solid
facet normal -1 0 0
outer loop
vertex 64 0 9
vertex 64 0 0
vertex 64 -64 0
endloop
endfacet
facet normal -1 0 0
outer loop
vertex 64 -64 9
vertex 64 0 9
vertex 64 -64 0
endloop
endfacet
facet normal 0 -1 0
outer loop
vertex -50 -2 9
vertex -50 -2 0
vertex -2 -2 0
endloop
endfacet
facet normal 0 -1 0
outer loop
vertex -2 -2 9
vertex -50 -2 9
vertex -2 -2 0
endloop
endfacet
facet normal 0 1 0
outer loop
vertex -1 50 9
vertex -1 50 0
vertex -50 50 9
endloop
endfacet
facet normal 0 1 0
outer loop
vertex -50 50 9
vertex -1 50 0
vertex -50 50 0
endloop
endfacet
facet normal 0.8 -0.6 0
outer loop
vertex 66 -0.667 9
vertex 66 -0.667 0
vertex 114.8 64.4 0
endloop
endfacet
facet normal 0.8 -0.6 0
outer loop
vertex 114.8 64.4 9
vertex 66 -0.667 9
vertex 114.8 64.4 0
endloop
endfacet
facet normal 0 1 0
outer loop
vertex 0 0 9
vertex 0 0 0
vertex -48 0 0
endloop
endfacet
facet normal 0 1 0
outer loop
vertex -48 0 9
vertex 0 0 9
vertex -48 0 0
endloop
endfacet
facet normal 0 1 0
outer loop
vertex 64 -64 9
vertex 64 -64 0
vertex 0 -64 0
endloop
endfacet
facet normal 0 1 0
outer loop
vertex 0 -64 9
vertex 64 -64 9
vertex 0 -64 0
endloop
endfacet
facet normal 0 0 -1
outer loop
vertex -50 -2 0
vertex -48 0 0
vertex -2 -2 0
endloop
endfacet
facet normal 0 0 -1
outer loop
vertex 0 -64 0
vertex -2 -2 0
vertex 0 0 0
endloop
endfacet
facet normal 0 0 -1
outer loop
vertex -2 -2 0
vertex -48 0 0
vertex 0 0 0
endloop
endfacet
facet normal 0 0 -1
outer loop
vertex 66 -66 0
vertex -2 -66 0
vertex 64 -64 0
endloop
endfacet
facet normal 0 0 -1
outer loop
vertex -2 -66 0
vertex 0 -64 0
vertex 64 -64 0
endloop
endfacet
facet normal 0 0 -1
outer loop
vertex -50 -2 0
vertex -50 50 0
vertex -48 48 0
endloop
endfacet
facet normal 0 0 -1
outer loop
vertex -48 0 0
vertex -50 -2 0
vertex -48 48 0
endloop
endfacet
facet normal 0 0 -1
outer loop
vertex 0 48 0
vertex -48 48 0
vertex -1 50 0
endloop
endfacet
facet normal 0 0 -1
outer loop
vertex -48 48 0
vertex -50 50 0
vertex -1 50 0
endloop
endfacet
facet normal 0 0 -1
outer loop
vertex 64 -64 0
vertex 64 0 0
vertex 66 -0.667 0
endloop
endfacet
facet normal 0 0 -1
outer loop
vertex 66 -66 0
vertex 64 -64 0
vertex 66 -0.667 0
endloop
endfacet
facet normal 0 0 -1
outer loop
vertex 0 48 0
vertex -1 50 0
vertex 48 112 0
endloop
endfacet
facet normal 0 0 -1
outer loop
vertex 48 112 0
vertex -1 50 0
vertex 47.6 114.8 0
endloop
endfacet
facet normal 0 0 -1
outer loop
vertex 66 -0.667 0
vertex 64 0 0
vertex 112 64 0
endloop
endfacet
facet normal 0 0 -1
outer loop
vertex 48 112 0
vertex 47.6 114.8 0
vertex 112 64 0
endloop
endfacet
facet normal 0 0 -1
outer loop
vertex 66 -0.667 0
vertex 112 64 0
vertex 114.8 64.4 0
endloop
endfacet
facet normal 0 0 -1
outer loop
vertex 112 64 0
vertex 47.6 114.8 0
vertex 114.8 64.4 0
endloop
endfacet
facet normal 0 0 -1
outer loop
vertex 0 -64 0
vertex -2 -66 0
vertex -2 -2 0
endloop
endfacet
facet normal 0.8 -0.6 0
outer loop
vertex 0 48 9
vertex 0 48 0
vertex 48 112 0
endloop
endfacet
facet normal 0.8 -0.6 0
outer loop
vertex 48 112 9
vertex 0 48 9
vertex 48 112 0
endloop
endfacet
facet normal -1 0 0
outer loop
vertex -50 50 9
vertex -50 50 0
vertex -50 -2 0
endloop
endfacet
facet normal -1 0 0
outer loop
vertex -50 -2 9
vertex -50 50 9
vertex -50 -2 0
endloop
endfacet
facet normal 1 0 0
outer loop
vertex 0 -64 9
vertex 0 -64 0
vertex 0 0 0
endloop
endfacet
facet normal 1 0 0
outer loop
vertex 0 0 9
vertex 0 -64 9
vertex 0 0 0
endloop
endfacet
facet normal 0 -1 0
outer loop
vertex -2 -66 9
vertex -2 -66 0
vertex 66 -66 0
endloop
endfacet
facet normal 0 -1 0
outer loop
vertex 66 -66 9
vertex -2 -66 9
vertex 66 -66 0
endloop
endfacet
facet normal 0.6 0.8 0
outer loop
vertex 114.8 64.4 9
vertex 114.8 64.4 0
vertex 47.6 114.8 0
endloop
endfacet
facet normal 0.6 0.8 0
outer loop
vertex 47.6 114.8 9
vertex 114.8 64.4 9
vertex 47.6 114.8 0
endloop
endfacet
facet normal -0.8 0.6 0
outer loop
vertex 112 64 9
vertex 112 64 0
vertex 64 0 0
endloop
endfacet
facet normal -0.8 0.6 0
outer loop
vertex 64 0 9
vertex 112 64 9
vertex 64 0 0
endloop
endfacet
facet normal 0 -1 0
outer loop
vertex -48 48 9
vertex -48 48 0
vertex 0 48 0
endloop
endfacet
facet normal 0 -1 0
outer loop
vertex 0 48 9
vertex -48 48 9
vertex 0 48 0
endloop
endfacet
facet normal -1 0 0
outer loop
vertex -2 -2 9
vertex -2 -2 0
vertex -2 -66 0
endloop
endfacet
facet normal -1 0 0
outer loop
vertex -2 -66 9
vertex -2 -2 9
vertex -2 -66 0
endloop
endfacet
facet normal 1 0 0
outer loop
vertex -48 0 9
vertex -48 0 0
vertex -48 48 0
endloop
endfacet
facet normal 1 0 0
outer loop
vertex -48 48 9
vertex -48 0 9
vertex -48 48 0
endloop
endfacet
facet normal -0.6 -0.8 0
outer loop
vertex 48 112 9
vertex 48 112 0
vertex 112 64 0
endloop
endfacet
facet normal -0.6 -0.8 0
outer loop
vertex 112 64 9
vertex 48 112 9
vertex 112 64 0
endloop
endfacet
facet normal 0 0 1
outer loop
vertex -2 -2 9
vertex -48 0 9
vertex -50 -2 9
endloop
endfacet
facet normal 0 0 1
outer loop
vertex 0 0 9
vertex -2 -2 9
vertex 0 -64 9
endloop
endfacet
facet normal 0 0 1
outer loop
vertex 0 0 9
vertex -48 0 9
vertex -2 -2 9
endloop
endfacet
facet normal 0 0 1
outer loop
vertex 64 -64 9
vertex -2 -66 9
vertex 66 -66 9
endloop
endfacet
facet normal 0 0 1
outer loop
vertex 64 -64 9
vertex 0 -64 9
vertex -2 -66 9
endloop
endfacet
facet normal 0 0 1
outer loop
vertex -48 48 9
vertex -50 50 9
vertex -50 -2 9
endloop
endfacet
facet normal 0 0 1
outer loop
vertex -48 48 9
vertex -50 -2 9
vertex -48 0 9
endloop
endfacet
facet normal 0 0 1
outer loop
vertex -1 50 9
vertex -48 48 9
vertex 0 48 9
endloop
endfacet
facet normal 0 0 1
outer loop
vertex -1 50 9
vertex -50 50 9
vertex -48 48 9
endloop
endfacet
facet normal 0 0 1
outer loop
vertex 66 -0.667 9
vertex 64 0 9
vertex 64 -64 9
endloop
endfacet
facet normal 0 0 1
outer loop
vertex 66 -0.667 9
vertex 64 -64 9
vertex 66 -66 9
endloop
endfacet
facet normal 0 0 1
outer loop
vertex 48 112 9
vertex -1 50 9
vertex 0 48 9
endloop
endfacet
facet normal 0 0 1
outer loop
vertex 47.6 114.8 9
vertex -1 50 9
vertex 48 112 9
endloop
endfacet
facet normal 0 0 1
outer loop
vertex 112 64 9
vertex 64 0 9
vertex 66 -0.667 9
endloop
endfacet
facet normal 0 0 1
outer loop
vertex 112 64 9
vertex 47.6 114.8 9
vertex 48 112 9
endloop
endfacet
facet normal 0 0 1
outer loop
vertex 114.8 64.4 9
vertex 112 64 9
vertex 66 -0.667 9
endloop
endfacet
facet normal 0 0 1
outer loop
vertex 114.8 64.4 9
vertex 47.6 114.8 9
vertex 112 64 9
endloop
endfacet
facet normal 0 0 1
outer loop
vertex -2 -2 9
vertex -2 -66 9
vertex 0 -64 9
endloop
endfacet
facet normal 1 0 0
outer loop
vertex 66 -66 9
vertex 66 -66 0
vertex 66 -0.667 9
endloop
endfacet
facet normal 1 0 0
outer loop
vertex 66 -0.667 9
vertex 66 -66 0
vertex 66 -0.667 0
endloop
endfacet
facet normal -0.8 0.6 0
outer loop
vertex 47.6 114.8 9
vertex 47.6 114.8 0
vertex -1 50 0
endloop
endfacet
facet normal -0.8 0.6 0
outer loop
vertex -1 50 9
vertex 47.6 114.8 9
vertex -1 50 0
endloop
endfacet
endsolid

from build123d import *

# Parameters (mm, degrees)
PAD_DEPTH = 9


with BuildPart() as part:
    # Sketch → Pad (new body)
    with BuildSketch(Plane.XY):
        Polygon((-1, 50), (-50, 50), (-50, -2), (-2, -2), (-2, -66), (66, -66), (66, -0.666667), (114.8, 64.4), (47.6, 114.8), align=None)
        Polygon((0, 48), (48, 112), (112, 64), (64, 0), (64, -64), (0, -64), (0, 0), (-48, 0), (-48, 48), align=None, mode=Mode.SUBTRACT)
    extrude(amount=PAD_DEPTH)


solid = part.part
